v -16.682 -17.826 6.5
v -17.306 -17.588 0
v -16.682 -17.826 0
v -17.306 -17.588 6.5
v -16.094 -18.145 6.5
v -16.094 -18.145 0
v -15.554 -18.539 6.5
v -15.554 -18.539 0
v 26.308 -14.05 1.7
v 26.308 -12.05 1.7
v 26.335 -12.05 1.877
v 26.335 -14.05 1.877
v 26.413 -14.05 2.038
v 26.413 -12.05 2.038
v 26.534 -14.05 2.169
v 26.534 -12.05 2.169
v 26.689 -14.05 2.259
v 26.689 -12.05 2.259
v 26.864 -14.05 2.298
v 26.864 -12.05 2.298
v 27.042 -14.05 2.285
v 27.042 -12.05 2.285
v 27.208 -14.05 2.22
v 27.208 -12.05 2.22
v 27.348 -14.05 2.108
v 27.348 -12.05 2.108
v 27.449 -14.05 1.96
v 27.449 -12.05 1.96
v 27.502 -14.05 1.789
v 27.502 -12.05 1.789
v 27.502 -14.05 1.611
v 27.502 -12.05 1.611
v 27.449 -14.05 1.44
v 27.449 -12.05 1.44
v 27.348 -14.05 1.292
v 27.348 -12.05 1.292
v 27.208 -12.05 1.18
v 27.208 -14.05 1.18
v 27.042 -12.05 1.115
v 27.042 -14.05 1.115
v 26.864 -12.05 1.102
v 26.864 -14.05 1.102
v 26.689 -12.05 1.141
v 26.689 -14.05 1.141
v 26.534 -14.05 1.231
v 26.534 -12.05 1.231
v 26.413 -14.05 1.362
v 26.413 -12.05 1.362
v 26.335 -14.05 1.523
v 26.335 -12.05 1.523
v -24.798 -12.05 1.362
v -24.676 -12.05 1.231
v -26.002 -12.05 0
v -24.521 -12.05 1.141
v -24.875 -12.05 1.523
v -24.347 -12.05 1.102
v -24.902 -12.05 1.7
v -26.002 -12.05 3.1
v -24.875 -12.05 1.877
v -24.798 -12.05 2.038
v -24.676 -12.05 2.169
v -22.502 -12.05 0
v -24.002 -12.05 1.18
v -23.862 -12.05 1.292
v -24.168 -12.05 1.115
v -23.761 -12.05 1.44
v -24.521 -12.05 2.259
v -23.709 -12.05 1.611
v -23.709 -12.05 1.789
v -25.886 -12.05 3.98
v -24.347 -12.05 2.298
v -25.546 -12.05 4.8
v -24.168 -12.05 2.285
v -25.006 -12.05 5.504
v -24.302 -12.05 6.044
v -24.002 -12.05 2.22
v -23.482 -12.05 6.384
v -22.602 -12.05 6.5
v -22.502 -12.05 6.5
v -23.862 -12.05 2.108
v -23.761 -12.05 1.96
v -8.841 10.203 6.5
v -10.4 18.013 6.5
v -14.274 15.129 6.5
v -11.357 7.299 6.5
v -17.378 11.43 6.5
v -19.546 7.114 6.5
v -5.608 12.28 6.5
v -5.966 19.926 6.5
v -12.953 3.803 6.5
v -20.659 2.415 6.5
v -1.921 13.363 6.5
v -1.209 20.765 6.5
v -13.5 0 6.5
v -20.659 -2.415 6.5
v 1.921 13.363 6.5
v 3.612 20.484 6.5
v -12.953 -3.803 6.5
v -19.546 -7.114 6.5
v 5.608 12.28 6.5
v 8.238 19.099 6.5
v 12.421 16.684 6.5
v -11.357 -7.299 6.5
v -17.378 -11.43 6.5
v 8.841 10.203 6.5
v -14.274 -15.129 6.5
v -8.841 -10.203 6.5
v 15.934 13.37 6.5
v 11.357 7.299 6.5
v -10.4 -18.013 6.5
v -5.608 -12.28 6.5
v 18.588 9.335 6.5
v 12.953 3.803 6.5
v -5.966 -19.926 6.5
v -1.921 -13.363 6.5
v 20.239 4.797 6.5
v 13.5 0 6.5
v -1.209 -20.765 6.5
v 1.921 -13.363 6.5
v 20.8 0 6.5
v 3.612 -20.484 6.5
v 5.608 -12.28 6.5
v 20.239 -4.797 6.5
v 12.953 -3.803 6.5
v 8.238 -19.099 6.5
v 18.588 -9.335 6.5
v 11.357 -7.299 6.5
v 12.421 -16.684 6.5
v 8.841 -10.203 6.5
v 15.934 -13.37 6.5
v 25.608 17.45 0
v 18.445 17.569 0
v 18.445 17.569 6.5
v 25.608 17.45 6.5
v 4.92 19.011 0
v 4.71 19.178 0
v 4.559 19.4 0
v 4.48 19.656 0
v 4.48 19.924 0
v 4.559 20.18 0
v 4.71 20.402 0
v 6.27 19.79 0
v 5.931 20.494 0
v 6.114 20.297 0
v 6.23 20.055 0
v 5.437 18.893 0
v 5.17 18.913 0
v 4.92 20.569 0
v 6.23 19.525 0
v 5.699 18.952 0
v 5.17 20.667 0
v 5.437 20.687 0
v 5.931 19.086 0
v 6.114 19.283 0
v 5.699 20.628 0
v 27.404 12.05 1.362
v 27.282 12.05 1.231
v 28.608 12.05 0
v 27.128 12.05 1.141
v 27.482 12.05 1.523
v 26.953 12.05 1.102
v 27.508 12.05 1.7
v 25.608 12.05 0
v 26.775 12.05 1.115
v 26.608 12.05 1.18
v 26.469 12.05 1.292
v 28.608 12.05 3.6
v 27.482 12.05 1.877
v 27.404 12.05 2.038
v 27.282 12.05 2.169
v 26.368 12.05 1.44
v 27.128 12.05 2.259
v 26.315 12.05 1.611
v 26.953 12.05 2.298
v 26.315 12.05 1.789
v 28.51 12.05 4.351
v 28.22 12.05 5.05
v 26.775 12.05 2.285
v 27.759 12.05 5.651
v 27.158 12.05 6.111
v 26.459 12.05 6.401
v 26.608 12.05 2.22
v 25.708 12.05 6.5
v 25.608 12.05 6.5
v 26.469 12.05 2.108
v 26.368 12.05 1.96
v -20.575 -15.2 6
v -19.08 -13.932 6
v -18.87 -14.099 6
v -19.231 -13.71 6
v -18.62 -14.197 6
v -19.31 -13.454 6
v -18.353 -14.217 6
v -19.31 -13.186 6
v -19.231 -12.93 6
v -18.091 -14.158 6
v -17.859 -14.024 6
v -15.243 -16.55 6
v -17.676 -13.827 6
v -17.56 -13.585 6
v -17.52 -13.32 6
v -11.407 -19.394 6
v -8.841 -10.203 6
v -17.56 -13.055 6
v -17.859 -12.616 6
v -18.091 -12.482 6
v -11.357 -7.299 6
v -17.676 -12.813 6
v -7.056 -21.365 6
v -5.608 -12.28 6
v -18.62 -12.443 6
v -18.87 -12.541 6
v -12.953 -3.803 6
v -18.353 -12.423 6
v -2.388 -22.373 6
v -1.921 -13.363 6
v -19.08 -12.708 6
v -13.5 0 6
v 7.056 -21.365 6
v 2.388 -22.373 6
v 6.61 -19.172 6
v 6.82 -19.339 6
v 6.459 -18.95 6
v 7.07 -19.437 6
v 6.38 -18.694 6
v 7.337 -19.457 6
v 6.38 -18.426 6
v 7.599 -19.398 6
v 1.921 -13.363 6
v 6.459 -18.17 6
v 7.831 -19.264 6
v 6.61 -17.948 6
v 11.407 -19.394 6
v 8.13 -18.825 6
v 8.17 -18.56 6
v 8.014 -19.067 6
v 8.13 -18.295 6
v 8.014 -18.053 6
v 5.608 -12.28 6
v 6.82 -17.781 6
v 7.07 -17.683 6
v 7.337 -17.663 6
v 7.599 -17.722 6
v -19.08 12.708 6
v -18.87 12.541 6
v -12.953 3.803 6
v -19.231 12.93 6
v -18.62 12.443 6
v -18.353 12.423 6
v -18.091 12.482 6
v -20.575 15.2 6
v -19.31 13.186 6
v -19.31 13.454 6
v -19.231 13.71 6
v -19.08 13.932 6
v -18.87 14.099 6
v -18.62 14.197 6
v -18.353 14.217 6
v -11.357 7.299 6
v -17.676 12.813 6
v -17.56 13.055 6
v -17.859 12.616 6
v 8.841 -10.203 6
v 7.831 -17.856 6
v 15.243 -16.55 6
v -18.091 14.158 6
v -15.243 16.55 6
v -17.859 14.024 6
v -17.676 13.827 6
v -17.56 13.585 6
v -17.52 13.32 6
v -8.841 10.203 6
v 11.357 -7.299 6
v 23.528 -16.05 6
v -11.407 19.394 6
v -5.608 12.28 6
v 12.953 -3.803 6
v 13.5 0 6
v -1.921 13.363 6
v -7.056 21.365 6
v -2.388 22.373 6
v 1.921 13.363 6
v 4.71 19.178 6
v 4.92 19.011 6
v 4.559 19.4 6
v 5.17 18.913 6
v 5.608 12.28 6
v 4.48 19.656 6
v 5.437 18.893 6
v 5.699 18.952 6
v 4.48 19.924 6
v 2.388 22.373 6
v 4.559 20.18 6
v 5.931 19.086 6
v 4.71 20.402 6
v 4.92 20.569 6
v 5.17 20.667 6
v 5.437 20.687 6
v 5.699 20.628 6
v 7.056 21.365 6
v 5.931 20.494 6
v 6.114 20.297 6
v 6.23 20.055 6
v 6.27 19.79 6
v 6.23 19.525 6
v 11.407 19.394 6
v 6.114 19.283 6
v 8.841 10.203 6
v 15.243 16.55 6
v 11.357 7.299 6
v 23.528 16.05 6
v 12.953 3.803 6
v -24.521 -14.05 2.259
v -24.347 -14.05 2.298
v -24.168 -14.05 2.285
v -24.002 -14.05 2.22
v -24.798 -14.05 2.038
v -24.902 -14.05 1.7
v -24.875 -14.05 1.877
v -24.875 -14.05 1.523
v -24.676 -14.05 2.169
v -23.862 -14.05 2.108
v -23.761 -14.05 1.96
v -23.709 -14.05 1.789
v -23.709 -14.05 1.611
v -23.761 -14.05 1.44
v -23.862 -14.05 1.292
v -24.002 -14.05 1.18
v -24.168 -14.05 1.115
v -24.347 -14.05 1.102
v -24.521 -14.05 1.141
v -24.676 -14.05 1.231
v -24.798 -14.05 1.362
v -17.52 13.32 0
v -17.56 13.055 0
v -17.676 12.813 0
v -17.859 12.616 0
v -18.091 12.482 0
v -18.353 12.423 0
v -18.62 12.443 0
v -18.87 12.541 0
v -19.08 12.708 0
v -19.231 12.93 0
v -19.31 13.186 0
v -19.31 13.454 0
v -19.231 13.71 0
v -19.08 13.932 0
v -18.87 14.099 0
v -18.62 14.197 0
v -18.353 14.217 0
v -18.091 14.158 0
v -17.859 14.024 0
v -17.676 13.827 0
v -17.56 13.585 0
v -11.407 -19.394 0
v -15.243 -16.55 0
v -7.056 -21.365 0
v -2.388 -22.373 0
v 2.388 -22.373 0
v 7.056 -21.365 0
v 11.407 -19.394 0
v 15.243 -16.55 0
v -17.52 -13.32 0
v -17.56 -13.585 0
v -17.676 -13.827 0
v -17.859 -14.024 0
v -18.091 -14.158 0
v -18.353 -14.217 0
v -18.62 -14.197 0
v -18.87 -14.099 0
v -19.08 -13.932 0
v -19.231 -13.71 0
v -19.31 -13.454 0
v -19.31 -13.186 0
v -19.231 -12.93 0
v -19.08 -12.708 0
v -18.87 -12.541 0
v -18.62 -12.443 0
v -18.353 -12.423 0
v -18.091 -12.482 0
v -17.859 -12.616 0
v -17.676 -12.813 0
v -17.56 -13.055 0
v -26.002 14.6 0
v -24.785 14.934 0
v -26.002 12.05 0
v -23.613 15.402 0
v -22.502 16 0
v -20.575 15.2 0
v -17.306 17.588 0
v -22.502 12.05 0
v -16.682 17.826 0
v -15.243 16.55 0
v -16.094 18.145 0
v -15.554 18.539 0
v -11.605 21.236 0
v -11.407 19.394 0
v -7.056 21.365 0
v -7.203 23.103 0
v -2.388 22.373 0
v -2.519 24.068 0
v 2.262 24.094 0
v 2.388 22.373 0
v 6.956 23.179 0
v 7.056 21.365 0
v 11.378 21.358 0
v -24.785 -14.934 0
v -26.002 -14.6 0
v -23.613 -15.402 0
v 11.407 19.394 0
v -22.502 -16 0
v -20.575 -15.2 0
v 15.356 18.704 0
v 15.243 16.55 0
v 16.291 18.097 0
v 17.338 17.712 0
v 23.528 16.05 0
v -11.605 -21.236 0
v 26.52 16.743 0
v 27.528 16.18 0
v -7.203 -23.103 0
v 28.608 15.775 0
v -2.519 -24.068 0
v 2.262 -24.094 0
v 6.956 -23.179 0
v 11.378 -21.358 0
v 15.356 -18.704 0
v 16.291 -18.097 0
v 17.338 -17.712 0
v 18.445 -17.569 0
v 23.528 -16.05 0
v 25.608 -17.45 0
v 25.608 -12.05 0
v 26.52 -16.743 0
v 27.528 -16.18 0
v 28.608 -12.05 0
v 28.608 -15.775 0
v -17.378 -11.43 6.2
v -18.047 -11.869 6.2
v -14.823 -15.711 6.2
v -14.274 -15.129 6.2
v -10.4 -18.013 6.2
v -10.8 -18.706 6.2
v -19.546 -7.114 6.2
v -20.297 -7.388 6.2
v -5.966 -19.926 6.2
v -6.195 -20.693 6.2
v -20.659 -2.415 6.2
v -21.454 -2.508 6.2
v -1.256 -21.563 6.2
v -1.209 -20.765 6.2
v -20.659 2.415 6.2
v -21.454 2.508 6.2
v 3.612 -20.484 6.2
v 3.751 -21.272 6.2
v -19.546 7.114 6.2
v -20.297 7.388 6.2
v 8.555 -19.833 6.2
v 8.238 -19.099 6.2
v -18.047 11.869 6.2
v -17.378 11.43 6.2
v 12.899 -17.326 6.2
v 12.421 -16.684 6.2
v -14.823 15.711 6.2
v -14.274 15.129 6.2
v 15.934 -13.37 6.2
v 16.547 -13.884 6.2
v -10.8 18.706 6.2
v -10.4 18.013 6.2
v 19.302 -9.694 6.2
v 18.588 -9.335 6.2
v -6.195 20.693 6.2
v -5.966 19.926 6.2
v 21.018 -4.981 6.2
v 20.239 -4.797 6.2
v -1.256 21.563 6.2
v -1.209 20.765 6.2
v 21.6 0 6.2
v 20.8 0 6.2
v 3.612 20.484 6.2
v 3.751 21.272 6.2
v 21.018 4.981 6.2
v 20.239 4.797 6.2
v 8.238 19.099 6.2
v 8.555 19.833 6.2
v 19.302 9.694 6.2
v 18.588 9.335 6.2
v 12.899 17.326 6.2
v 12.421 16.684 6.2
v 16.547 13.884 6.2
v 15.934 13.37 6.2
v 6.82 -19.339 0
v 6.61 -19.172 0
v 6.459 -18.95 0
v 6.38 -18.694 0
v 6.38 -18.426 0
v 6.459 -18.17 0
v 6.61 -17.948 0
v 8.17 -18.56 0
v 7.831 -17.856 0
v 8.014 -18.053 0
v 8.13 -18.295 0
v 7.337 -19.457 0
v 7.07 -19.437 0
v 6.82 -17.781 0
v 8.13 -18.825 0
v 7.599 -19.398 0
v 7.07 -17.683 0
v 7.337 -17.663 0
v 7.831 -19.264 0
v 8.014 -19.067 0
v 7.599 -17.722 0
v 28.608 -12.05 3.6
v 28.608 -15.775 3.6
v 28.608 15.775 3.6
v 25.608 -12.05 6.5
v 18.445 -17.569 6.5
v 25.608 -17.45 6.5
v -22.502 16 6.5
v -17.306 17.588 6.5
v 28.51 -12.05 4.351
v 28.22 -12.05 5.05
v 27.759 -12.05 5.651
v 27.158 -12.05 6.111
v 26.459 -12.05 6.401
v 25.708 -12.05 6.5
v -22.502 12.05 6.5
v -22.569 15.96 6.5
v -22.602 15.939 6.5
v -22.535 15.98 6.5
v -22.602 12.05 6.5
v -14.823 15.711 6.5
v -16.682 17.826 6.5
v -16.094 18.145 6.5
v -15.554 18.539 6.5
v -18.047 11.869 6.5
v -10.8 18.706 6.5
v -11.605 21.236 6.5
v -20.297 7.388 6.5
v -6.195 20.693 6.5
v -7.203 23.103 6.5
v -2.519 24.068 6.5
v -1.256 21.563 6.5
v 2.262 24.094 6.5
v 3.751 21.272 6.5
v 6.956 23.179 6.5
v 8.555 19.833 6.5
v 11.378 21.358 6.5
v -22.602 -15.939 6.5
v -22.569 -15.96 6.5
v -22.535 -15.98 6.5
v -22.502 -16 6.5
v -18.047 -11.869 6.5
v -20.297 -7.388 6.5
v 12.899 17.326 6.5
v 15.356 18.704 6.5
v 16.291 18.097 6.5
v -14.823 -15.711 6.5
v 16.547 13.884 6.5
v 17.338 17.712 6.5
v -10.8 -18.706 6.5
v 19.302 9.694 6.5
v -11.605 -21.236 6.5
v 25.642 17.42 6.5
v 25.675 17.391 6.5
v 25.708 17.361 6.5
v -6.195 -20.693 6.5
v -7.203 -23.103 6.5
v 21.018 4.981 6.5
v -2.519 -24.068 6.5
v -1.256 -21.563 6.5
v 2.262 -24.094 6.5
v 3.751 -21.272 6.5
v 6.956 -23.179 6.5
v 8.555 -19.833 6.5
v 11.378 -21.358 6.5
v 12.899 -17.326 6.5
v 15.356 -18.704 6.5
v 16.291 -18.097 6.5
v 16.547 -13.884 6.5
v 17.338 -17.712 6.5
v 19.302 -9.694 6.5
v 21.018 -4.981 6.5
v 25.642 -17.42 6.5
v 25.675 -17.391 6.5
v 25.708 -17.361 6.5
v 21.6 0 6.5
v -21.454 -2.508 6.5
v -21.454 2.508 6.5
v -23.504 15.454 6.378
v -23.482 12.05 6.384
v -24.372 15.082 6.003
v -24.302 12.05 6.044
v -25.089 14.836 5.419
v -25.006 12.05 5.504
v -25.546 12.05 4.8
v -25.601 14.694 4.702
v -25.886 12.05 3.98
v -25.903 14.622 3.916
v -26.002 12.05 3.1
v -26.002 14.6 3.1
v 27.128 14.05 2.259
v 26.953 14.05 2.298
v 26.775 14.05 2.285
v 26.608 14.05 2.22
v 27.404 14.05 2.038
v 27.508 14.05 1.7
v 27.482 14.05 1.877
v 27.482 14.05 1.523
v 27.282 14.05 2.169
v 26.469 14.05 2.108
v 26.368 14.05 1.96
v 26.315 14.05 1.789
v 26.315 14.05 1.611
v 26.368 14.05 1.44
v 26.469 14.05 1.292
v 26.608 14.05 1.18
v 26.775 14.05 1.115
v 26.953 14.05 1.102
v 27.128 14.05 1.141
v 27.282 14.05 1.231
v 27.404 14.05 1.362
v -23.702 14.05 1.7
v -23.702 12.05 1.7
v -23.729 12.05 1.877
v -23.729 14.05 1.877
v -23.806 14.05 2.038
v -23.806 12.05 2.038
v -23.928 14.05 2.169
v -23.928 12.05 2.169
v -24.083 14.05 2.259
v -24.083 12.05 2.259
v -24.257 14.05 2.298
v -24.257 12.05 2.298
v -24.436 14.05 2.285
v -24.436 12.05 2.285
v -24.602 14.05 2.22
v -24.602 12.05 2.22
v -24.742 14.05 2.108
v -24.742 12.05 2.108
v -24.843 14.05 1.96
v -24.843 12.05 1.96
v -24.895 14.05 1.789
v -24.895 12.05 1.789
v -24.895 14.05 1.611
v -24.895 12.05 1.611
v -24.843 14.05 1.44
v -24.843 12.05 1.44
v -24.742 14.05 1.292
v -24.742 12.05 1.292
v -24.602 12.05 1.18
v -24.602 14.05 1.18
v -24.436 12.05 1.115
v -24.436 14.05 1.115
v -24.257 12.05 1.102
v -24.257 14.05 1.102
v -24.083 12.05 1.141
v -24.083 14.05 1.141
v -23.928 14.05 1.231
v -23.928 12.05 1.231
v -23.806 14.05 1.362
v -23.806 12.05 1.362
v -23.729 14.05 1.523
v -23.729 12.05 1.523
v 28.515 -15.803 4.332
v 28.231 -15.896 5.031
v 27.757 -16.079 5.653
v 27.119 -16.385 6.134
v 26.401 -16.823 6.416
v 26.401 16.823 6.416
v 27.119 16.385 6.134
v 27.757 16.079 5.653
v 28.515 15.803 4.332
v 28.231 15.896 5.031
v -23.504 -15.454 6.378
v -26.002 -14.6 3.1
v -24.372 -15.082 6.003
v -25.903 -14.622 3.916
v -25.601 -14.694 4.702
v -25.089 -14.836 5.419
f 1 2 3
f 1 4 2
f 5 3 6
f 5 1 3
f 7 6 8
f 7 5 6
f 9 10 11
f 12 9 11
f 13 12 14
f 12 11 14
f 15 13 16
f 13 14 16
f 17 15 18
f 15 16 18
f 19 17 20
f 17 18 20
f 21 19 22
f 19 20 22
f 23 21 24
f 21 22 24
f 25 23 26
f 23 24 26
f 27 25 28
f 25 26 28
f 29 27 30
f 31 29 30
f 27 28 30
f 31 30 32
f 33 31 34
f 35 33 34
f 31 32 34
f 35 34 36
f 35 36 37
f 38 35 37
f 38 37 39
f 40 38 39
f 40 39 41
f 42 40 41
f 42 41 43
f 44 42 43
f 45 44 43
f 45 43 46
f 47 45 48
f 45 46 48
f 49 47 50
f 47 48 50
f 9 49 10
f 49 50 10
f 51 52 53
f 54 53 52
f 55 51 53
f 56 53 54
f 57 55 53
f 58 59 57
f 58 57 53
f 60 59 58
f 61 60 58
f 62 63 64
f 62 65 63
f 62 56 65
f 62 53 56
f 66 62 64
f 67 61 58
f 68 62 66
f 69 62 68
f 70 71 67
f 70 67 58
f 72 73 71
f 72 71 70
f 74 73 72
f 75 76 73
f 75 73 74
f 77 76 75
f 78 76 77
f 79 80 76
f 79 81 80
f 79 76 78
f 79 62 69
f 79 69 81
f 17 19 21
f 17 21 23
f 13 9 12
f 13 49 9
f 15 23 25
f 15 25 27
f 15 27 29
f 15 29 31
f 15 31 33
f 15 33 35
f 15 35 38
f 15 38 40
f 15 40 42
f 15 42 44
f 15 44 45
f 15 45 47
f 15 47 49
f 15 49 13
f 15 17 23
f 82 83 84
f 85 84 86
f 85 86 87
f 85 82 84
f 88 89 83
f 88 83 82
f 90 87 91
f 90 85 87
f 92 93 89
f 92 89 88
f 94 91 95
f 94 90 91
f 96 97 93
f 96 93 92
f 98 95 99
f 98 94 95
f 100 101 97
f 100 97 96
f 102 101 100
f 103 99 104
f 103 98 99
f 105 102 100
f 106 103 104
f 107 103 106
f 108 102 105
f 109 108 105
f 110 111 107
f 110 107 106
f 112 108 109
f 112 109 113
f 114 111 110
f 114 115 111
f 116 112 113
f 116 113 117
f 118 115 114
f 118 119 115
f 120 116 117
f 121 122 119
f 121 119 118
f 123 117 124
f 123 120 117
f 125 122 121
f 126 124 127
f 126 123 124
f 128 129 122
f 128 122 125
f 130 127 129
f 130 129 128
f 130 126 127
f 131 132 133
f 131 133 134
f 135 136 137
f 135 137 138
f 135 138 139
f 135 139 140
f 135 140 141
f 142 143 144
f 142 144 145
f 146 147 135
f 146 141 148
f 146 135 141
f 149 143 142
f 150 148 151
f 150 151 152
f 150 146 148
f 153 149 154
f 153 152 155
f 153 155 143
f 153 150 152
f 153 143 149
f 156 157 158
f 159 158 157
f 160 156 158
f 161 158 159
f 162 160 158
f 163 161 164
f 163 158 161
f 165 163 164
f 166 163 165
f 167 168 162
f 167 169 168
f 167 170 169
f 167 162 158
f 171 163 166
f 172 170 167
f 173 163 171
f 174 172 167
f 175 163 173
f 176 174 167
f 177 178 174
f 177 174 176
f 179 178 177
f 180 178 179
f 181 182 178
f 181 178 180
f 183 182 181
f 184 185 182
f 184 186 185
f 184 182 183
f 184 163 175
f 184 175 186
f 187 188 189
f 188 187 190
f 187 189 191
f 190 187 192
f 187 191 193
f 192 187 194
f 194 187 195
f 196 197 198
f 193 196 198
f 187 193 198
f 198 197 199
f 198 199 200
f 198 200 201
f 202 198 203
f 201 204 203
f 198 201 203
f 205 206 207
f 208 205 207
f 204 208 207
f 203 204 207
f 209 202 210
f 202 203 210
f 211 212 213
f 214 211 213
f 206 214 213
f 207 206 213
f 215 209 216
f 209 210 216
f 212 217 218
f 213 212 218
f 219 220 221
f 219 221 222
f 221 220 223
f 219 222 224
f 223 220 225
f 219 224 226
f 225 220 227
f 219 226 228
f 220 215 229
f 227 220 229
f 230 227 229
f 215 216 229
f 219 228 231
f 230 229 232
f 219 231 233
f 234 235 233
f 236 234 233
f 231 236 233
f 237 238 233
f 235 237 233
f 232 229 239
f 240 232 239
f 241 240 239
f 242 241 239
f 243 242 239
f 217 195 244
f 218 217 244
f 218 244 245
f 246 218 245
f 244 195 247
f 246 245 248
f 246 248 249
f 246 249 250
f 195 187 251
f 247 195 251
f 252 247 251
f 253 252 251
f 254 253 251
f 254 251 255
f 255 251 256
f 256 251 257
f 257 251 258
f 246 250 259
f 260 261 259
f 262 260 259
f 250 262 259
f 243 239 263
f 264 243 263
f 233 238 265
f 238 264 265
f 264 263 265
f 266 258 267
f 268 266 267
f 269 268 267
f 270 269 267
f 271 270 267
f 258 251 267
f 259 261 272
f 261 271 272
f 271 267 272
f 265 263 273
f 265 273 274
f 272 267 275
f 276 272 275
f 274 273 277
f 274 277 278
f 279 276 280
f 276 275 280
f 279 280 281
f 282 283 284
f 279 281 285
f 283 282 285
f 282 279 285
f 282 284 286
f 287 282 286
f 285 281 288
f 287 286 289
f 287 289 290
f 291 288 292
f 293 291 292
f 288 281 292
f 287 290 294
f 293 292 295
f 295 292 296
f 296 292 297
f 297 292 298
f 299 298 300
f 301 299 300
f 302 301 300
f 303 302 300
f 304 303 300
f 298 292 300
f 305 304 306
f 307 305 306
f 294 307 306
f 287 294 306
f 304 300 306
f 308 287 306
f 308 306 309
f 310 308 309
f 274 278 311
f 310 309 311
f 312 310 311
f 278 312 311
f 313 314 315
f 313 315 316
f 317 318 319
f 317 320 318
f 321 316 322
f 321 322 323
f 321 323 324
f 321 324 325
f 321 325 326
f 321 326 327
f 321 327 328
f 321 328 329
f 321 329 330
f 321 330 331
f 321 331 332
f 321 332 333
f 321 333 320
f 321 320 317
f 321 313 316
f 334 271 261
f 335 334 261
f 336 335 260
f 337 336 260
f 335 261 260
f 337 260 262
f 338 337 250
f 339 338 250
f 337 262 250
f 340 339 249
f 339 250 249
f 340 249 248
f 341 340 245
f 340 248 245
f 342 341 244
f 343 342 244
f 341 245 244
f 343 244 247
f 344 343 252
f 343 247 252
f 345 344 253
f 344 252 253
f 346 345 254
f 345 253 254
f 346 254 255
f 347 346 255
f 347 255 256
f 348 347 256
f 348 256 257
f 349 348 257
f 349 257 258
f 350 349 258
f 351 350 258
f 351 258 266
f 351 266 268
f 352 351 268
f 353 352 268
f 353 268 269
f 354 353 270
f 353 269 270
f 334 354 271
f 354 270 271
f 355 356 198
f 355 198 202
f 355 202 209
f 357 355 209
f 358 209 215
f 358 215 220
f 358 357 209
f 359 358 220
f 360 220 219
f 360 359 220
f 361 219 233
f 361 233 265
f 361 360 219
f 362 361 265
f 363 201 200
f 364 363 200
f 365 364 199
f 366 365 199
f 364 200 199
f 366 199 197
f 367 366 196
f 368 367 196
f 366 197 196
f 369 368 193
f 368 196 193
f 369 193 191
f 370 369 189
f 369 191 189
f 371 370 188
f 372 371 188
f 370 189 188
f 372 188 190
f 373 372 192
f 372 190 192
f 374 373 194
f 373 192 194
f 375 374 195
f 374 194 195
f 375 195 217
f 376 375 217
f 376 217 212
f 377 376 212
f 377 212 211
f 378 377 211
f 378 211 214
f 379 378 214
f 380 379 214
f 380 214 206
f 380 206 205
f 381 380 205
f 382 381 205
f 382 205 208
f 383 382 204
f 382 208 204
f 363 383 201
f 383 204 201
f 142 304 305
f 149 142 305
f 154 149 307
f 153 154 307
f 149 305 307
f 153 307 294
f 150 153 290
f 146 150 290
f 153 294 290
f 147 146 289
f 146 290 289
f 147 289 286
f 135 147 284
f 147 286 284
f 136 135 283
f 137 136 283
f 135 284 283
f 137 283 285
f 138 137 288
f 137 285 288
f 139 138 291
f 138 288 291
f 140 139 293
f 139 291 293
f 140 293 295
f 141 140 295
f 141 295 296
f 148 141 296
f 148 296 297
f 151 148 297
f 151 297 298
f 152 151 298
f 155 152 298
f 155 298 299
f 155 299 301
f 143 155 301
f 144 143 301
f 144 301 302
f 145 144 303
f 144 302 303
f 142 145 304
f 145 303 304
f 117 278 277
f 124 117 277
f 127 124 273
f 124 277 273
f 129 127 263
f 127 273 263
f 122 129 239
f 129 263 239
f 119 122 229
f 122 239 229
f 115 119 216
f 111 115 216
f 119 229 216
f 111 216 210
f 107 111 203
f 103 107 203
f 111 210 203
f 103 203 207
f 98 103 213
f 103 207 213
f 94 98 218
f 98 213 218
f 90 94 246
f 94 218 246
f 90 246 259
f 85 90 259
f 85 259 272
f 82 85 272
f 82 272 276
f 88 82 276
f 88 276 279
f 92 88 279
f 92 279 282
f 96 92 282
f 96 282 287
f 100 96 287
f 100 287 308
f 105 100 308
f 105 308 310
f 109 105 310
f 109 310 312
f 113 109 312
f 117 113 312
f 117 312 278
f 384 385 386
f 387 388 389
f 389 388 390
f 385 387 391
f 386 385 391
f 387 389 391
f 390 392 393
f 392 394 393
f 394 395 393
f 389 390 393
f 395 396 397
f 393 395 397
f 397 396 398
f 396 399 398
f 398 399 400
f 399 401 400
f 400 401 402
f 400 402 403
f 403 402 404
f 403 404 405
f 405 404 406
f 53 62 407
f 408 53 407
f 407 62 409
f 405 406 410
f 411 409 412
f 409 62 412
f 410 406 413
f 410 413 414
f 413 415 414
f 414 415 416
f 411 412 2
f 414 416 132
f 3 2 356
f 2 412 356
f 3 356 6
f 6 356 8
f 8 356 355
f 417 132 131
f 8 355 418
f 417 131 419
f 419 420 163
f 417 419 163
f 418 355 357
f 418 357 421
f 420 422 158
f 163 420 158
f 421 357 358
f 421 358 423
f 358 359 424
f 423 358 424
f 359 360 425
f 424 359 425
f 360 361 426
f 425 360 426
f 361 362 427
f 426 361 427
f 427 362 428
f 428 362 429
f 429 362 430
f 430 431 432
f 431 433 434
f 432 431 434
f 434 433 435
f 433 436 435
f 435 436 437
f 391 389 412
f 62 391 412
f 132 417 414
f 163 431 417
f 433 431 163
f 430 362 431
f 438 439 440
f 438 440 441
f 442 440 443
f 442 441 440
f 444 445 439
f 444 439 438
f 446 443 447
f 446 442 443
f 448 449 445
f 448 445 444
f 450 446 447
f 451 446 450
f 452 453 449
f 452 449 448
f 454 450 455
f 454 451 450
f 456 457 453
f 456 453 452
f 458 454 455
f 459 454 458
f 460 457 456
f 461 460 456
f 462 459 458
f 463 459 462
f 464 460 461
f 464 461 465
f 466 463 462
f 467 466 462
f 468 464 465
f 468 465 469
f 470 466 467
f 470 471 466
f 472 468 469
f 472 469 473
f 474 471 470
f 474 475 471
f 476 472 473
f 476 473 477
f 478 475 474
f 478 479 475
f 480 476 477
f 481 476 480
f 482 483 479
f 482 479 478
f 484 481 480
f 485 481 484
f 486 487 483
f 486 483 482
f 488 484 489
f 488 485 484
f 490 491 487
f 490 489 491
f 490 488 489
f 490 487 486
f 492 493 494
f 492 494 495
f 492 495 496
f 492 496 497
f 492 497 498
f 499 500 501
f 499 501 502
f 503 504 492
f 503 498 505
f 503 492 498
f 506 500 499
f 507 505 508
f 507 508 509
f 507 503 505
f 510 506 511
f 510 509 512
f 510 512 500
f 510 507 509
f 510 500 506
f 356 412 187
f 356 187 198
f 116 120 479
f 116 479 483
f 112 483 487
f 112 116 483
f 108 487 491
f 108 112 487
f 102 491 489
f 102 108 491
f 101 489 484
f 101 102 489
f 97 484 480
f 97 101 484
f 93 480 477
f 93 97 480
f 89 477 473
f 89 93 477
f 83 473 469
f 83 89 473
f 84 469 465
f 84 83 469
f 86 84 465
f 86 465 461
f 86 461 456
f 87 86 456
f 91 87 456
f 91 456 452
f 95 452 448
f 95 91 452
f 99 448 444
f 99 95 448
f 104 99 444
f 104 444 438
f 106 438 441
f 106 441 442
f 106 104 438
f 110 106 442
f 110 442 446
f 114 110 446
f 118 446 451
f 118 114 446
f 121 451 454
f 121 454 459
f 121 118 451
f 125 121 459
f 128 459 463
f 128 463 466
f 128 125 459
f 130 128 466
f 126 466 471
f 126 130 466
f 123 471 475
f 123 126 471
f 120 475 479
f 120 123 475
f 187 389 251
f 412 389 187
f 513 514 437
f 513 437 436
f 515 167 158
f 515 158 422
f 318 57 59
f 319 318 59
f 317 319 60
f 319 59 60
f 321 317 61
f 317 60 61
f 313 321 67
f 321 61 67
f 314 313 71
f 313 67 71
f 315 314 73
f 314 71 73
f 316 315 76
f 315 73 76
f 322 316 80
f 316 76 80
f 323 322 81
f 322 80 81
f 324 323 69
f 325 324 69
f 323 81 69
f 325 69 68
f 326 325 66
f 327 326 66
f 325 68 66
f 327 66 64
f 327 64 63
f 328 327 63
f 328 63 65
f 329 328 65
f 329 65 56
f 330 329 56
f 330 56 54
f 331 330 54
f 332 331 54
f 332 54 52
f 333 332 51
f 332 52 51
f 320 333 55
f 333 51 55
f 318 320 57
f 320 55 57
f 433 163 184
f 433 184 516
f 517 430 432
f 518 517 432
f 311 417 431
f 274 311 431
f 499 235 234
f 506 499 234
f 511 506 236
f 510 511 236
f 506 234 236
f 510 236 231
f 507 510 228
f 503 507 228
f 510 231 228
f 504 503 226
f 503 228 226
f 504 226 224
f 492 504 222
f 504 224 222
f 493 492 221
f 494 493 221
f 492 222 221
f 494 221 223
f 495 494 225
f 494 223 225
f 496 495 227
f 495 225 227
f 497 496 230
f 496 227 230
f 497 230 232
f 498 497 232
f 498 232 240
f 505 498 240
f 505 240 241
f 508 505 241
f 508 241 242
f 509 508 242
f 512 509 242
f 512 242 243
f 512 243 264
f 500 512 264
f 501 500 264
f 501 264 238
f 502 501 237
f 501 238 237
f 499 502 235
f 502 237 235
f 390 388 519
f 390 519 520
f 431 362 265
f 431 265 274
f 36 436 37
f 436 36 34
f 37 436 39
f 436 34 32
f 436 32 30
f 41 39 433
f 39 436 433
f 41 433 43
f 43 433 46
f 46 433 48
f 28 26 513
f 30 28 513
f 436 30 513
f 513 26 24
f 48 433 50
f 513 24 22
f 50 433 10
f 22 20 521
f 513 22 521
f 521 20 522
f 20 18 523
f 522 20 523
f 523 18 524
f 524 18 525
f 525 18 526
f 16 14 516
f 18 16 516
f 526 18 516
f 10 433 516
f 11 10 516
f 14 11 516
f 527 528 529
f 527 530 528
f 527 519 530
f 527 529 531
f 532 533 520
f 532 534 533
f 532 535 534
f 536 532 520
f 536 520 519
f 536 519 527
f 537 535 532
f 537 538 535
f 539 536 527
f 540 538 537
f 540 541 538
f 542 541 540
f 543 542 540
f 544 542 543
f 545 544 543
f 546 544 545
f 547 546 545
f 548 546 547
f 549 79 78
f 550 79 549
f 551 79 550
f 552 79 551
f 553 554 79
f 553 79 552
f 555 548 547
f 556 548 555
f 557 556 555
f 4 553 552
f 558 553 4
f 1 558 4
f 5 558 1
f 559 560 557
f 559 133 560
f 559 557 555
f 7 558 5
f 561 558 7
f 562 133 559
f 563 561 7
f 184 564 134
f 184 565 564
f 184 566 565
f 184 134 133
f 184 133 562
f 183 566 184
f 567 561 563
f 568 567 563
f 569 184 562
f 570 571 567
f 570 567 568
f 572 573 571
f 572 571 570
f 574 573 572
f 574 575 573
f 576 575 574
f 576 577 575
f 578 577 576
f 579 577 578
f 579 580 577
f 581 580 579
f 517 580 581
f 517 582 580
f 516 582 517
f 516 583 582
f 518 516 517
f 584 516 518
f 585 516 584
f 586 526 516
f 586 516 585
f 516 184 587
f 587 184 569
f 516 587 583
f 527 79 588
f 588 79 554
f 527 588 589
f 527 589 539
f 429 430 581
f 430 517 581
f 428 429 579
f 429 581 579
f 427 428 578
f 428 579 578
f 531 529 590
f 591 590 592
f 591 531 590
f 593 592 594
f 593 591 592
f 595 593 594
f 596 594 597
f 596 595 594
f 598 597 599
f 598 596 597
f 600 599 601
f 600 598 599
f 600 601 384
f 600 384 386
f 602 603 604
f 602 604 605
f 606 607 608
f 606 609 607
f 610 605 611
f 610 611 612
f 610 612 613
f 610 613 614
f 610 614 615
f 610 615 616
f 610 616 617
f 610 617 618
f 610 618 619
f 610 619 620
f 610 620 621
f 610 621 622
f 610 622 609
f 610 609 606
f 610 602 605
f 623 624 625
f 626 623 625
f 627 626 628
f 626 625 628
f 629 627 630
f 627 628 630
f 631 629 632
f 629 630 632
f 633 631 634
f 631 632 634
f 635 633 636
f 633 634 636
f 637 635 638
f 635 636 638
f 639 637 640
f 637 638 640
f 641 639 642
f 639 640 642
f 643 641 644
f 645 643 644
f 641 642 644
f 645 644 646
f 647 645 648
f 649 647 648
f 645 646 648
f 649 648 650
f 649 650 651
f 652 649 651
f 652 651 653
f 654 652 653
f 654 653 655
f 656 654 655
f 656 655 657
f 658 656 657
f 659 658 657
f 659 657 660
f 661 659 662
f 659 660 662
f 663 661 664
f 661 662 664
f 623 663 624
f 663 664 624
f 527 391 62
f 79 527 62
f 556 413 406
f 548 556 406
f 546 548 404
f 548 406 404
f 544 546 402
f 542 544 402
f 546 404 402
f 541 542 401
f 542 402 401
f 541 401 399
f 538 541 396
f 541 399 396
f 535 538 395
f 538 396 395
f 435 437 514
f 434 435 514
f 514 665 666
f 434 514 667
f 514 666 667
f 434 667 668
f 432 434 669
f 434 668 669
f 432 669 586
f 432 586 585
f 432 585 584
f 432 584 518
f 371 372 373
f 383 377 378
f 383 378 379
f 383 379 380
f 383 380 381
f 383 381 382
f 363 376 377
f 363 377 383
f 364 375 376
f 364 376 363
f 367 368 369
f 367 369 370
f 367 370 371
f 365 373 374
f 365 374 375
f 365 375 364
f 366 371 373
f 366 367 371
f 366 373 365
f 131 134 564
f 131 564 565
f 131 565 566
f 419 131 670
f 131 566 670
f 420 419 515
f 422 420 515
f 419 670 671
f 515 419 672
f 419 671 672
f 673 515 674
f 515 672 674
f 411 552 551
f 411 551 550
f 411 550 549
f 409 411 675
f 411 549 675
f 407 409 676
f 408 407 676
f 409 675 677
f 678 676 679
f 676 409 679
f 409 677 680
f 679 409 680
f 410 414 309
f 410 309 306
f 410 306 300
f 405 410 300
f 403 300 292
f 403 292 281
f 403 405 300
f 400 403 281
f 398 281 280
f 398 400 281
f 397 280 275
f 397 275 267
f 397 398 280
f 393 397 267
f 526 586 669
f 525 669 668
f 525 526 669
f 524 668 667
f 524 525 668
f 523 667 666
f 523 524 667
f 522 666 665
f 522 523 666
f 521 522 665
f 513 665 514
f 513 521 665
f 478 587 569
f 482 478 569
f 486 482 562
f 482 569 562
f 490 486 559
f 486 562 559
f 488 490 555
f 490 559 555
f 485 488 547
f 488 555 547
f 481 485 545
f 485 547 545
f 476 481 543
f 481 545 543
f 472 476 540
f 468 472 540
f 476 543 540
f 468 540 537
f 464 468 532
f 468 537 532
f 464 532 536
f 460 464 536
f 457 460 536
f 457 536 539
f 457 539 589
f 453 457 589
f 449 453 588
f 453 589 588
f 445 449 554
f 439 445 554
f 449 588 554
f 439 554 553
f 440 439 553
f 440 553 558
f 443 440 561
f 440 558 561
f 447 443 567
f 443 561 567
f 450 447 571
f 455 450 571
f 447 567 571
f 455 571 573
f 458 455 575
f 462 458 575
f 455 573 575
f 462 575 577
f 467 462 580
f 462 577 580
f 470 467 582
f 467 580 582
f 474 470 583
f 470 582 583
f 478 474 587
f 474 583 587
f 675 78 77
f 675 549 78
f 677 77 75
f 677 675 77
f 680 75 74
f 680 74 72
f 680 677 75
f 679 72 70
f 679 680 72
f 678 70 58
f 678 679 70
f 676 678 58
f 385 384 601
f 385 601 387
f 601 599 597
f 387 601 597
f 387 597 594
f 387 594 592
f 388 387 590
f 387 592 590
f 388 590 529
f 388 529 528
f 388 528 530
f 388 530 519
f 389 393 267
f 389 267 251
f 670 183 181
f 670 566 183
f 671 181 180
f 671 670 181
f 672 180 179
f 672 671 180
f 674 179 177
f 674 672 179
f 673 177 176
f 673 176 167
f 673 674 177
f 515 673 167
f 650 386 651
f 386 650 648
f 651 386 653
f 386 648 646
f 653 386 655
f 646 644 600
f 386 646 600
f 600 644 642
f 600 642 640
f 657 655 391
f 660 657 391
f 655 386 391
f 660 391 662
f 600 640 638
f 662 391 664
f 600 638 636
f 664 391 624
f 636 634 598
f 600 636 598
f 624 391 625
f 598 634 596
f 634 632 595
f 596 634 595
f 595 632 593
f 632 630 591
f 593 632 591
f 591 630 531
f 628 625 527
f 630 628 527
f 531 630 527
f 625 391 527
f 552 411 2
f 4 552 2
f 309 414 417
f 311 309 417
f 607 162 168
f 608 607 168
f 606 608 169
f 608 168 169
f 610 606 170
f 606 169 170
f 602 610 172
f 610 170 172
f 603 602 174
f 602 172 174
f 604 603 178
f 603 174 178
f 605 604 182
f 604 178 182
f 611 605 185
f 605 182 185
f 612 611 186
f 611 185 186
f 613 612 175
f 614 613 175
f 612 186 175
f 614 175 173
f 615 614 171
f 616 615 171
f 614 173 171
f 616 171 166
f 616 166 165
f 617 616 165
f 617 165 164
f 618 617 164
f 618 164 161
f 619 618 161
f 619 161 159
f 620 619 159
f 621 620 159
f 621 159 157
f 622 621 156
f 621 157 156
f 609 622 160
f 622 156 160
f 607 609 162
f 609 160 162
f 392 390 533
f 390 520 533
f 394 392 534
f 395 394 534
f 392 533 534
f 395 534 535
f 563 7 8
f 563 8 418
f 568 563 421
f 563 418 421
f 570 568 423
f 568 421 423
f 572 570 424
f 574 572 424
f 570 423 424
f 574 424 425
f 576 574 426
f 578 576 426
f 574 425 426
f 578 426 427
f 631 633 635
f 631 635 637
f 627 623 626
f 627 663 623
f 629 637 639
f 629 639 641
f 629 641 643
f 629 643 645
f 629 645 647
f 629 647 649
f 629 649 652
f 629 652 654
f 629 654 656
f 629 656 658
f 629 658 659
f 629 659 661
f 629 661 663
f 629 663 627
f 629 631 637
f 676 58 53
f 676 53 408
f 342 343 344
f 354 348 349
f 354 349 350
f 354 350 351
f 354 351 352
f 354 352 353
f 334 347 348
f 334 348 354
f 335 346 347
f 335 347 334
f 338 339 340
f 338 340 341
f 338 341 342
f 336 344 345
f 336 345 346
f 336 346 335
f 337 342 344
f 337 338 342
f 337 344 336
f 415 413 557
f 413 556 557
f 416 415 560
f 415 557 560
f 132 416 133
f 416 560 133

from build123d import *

# Parameters (mm, degrees)
PAD_DEPTH       = 6.5
POCKET_DEPTH    = 6
SKETCH002_R     = 13.5
POCKET001_DEPTH = 1
SKETCH003_W     = 5.4
SKETCH003_H     = 6.5
PAD001_DEPTH    = 3
POCKET002_DEPTH = 10
SKETCH008_R     = 0.6
POCKET003_DEPTH = 2
SKETCH009_R     = 0.6
POCKET004_DEPTH = 2
FILLET_R        = 2.9
FILLET001_R     = 2.9
FILLET002_R     = 5
FILLET003_R     = 5
FILLET004_R     = 5
FILLET005_R     = 5
SKETCH010_W     = 3.95
SKETCH010_H     = 6.5
PAD002_DEPTH    = 3.5
POCKET005_DEPTH = 10
SKETCH012_R     = 0.6
POCKET006_DEPTH = 2
SKETCH013_R     = 0.6
POCKET007_DEPTH = 2
FILLET006_R     = 3.4
FILLET007_R     = 3.4
SKETCH014_R     = 21.6
SKETCH014_R_2   = 20.8
POCKET008_DEPTH = 0.3
SKETCH015_R     = 0.9
PAD003_DEPTH    = 6


with BuildPart() as part:
    # Sketch → Pad (new body)
    with BuildSketch(Plane.XY):
        with BuildLine():
            Line((-22.501992, 16), (-22.501992, -16))
            Line((-22.501992, -16), (-16.285883, -17.9))
            ThreePointArc((-16.285883, -17.9), (0.22069, -24.198994), (16.609636, -17.6))
            Line((16.609636, -17.6), (25.608386, -17.45))
            Line((25.608386, 17.45), (25.608386, -17.45))
            Line((16.609636, 17.6), (25.608386, 17.45))
            ThreePointArc((16.609636, 17.6), (0.22069, 24.198994), (-16.285883, 17.9))
            Line((-22.501992, 16), (-16.285883, 17.9))
        make_face()
    extrude(amount=PAD_DEPTH)

    # Sketch001 → Pocket (cut)
    with BuildSketch(Plane.XY):
        with BuildLine():
            Line((-15.242949, 16.55), (-20.574694, 15.2))
            Line((-20.574694, 15.2), (-20.574694, -15.2))
            Line((-20.574694, -15.2), (-15.242949, -16.55))
            ThreePointArc((-15.242949, -16.55), (0, -22.5), (15.242949, -16.55))
            Line((15.242949, -16.55), (23.527875, -16.05))
            Line((23.527875, 16.05), (23.527875, -16.05))
            Line((15.242949, 16.55), (23.527875, 16.05))
            ThreePointArc((15.242949, 16.55), (0, 22.5), (-15.242949, 16.55))
        make_face()
    extrude(amount=POCKET_DEPTH, mode=Mode.SUBTRACT)

    # Sketch002 (on Face19 of Pocket) → Pocket001 (cut)
    with BuildSketch(Plane(origin=(0, 0, 6), x_dir=(1, 0, 0), z_dir=(0, 0, -1))):
        Circle(SKETCH002_R)
    extrude(amount=-POCKET001_DEPTH, mode=Mode.SUBTRACT)

    # Sketch003 (on Face6 of Pocket001) → Pad001 (join)
    with BuildSketch(Plane.YZ.offset(25.608386)):
        with Locations((-14.75, 3.25)):
            Rectangle(SKETCH003_W, SKETCH003_H)
        with Locations((14.75, 3.25)):
            Rectangle(SKETCH003_W, SKETCH003_H)
    extrude(amount=PAD001_DEPTH)

    # Sketch006 → Pocket002 (cut)
    with BuildSketch(Plane.XY.offset(6.5)):
        with BuildLine():
            ThreePointArc((25.608386, 17.45), (27.01354, 16.442644), (28.608386, 15.775042))
            Line((28.608386, 17.45), (28.608386, 15.775042))
            Line((28.608386, 17.45), (25.608386, 17.45))
        make_face()
        with BuildLine():
            ThreePointArc((28.608386, -15.775042), (27.01354, -16.442644), (25.608386, -17.45))
            Line((28.608386, -17.45), (25.608386, -17.45))
            Line((28.608386, -15.775042), (28.608386, -17.45))
        make_face()
    extrude(amount=-POCKET002_DEPTH, mode=Mode.SUBTRACT)

    # Sketch008 (on Face27 of Pocket002) → Pocket003 (cut)
    with BuildSketch(Plane(origin=(0, -12.05, 0), x_dir=(-1, 0, 0), z_dir=(0, 1, 0))):
        with Locations((-26.908386, 1.7)):
            Circle(SKETCH008_R)
    extrude(amount=-POCKET003_DEPTH, mode=Mode.SUBTRACT)

    # Sketch009 (on Face26 of Pocket003) → Pocket004 (cut)
    with BuildSketch(Plane.XZ.offset(-12.05)):
        with Locations((26.908386, 1.7)):
            Circle(SKETCH009_R)
    extrude(amount=-POCKET004_DEPTH, mode=Mode.SUBTRACT)

    # Fillet
    fillet_edges = [part.edges().sort_by_distance(p)[0] for p in [
        (28.608386, -13.912521, 6.5),
    ]]
    fillet(fillet_edges, radius=FILLET_R)

    # Fillet001
    fillet001_edges = [part.edges().sort_by_distance(p)[0] for p in [
        (28.608386, 13.912521, 6.5),
    ]]
    fillet(fillet001_edges, radius=FILLET001_R)

    # Fillet002
    fillet002_edges = [part.edges().sort_by_distance(p)[0] for p in [
        (16.609636, -17.6, 3.25),
    ]]
    fillet(fillet002_edges, radius=FILLET002_R)

    # Fillet003
    fillet003_edges = [part.edges().sort_by_distance(p)[0] for p in [
        (16.609636, 17.6, 3.25),
    ]]
    fillet(fillet003_edges, radius=FILLET003_R)

    # Fillet004
    fillet004_edges = [part.edges().sort_by_distance(p)[0] for p in [
        (-16.285883, -17.9, 3.25),
    ]]
    fillet(fillet004_edges, radius=FILLET004_R)

    # Fillet005
    fillet005_edges = [part.edges().sort_by_distance(p)[0] for p in [
        (-16.285883, 17.9, 3.25),
    ]]
    fillet(fillet005_edges, radius=FILLET005_R)

    # Sketch010 (on Face4 of Fillet005) → Pad002 (join)
    with BuildSketch(Plane(origin=(-22.501992, 0, 0), x_dir=(0, -1, 0), z_dir=(-1, 0, 0))):
        with Locations((-14.025, 3.25)):
            Rectangle(SKETCH010_W, SKETCH010_H)
        with Locations((14.025, 3.25)):
            Rectangle(SKETCH010_W, SKETCH010_H)
    extrude(amount=PAD002_DEPTH)

    # Sketch011 (on Face6 of Pad002) → Pocket005 (cut)
    with BuildSketch(Plane.XY.offset(6.5)):
        with BuildLine():
            ThreePointArc((-26.001992, 14.6), (-24.192608, 15.15154), (-22.501992, 16))
            Line((-22.501992, 16), (-26.001992, 16))
            Line((-26.001992, 16), (-26.001992, 14.6))
        make_face()
        with BuildLine():
            ThreePointArc((-22.501992, -16), (-24.192608, -15.15154), (-26.001992, -14.6))
            Line((-26.001992, -14.6), (-26.001992, -16))
            Line((-26.001992, -16), (-22.501992, -16))
        make_face()
    extrude(amount=-POCKET005_DEPTH, mode=Mode.SUBTRACT)

    # Sketch012 (on Face23 of Pocket005) → Pocket006 (cut)
    with BuildSketch(Plane(origin=(0, -12.05, 0), x_dir=(-1, 0, 0), z_dir=(0, 1, 0))):
        with Locations((24.301992, 1.7)):
            Circle(SKETCH012_R)
    extrude(amount=-POCKET006_DEPTH, mode=Mode.SUBTRACT)

    # Sketch013 (on Face21 of Pocket006) → Pocket007 (cut)
    with BuildSketch(Plane.XZ.offset(-12.05)):
        with Locations((-24.301992, 1.7)):
            Circle(SKETCH013_R)
    extrude(amount=-POCKET007_DEPTH, mode=Mode.SUBTRACT)

    # Fillet006
    fillet006_edges = [part.edges().sort_by_distance(p)[0] for p in [
        (-26.001992, 13.325, 6.5),
    ]]
    fillet(fillet006_edges, radius=FILLET006_R)

    # Fillet007
    fillet007_edges = [part.edges().sort_by_distance(p)[0] for p in [
        (-26.001992, -13.325, 6.5),
    ]]
    fillet(fillet007_edges, radius=FILLET007_R)

    # Sketch014 (on Face4 of Fillet007) → Pocket008 (cut)
    with BuildSketch(Plane.XY.offset(6.5)):
        Circle(SKETCH014_R)
        Circle(SKETCH014_R_2, mode=Mode.SUBTRACT)
    extrude(amount=-POCKET008_DEPTH, mode=Mode.SUBTRACT)

    # Sketch015 (on Face55 of Pocket008) → Pad003 (join)
    with BuildSketch(Plane(origin=(0, 0, 6), x_dir=(1, 0, 0), z_dir=(0, 0, -1))):
        with Locations((-18.42, 13.32)):
            Circle(SKETCH015_R)
        with Locations((-18.42, -13.32)):
            Circle(SKETCH015_R)
        with Locations((7.27, 18.56)):
            Circle(SKETCH015_R)
        with Locations((5.37, -19.79)):
            Circle(SKETCH015_R)
    extrude(amount=PAD003_DEPTH)


solid = part.part
